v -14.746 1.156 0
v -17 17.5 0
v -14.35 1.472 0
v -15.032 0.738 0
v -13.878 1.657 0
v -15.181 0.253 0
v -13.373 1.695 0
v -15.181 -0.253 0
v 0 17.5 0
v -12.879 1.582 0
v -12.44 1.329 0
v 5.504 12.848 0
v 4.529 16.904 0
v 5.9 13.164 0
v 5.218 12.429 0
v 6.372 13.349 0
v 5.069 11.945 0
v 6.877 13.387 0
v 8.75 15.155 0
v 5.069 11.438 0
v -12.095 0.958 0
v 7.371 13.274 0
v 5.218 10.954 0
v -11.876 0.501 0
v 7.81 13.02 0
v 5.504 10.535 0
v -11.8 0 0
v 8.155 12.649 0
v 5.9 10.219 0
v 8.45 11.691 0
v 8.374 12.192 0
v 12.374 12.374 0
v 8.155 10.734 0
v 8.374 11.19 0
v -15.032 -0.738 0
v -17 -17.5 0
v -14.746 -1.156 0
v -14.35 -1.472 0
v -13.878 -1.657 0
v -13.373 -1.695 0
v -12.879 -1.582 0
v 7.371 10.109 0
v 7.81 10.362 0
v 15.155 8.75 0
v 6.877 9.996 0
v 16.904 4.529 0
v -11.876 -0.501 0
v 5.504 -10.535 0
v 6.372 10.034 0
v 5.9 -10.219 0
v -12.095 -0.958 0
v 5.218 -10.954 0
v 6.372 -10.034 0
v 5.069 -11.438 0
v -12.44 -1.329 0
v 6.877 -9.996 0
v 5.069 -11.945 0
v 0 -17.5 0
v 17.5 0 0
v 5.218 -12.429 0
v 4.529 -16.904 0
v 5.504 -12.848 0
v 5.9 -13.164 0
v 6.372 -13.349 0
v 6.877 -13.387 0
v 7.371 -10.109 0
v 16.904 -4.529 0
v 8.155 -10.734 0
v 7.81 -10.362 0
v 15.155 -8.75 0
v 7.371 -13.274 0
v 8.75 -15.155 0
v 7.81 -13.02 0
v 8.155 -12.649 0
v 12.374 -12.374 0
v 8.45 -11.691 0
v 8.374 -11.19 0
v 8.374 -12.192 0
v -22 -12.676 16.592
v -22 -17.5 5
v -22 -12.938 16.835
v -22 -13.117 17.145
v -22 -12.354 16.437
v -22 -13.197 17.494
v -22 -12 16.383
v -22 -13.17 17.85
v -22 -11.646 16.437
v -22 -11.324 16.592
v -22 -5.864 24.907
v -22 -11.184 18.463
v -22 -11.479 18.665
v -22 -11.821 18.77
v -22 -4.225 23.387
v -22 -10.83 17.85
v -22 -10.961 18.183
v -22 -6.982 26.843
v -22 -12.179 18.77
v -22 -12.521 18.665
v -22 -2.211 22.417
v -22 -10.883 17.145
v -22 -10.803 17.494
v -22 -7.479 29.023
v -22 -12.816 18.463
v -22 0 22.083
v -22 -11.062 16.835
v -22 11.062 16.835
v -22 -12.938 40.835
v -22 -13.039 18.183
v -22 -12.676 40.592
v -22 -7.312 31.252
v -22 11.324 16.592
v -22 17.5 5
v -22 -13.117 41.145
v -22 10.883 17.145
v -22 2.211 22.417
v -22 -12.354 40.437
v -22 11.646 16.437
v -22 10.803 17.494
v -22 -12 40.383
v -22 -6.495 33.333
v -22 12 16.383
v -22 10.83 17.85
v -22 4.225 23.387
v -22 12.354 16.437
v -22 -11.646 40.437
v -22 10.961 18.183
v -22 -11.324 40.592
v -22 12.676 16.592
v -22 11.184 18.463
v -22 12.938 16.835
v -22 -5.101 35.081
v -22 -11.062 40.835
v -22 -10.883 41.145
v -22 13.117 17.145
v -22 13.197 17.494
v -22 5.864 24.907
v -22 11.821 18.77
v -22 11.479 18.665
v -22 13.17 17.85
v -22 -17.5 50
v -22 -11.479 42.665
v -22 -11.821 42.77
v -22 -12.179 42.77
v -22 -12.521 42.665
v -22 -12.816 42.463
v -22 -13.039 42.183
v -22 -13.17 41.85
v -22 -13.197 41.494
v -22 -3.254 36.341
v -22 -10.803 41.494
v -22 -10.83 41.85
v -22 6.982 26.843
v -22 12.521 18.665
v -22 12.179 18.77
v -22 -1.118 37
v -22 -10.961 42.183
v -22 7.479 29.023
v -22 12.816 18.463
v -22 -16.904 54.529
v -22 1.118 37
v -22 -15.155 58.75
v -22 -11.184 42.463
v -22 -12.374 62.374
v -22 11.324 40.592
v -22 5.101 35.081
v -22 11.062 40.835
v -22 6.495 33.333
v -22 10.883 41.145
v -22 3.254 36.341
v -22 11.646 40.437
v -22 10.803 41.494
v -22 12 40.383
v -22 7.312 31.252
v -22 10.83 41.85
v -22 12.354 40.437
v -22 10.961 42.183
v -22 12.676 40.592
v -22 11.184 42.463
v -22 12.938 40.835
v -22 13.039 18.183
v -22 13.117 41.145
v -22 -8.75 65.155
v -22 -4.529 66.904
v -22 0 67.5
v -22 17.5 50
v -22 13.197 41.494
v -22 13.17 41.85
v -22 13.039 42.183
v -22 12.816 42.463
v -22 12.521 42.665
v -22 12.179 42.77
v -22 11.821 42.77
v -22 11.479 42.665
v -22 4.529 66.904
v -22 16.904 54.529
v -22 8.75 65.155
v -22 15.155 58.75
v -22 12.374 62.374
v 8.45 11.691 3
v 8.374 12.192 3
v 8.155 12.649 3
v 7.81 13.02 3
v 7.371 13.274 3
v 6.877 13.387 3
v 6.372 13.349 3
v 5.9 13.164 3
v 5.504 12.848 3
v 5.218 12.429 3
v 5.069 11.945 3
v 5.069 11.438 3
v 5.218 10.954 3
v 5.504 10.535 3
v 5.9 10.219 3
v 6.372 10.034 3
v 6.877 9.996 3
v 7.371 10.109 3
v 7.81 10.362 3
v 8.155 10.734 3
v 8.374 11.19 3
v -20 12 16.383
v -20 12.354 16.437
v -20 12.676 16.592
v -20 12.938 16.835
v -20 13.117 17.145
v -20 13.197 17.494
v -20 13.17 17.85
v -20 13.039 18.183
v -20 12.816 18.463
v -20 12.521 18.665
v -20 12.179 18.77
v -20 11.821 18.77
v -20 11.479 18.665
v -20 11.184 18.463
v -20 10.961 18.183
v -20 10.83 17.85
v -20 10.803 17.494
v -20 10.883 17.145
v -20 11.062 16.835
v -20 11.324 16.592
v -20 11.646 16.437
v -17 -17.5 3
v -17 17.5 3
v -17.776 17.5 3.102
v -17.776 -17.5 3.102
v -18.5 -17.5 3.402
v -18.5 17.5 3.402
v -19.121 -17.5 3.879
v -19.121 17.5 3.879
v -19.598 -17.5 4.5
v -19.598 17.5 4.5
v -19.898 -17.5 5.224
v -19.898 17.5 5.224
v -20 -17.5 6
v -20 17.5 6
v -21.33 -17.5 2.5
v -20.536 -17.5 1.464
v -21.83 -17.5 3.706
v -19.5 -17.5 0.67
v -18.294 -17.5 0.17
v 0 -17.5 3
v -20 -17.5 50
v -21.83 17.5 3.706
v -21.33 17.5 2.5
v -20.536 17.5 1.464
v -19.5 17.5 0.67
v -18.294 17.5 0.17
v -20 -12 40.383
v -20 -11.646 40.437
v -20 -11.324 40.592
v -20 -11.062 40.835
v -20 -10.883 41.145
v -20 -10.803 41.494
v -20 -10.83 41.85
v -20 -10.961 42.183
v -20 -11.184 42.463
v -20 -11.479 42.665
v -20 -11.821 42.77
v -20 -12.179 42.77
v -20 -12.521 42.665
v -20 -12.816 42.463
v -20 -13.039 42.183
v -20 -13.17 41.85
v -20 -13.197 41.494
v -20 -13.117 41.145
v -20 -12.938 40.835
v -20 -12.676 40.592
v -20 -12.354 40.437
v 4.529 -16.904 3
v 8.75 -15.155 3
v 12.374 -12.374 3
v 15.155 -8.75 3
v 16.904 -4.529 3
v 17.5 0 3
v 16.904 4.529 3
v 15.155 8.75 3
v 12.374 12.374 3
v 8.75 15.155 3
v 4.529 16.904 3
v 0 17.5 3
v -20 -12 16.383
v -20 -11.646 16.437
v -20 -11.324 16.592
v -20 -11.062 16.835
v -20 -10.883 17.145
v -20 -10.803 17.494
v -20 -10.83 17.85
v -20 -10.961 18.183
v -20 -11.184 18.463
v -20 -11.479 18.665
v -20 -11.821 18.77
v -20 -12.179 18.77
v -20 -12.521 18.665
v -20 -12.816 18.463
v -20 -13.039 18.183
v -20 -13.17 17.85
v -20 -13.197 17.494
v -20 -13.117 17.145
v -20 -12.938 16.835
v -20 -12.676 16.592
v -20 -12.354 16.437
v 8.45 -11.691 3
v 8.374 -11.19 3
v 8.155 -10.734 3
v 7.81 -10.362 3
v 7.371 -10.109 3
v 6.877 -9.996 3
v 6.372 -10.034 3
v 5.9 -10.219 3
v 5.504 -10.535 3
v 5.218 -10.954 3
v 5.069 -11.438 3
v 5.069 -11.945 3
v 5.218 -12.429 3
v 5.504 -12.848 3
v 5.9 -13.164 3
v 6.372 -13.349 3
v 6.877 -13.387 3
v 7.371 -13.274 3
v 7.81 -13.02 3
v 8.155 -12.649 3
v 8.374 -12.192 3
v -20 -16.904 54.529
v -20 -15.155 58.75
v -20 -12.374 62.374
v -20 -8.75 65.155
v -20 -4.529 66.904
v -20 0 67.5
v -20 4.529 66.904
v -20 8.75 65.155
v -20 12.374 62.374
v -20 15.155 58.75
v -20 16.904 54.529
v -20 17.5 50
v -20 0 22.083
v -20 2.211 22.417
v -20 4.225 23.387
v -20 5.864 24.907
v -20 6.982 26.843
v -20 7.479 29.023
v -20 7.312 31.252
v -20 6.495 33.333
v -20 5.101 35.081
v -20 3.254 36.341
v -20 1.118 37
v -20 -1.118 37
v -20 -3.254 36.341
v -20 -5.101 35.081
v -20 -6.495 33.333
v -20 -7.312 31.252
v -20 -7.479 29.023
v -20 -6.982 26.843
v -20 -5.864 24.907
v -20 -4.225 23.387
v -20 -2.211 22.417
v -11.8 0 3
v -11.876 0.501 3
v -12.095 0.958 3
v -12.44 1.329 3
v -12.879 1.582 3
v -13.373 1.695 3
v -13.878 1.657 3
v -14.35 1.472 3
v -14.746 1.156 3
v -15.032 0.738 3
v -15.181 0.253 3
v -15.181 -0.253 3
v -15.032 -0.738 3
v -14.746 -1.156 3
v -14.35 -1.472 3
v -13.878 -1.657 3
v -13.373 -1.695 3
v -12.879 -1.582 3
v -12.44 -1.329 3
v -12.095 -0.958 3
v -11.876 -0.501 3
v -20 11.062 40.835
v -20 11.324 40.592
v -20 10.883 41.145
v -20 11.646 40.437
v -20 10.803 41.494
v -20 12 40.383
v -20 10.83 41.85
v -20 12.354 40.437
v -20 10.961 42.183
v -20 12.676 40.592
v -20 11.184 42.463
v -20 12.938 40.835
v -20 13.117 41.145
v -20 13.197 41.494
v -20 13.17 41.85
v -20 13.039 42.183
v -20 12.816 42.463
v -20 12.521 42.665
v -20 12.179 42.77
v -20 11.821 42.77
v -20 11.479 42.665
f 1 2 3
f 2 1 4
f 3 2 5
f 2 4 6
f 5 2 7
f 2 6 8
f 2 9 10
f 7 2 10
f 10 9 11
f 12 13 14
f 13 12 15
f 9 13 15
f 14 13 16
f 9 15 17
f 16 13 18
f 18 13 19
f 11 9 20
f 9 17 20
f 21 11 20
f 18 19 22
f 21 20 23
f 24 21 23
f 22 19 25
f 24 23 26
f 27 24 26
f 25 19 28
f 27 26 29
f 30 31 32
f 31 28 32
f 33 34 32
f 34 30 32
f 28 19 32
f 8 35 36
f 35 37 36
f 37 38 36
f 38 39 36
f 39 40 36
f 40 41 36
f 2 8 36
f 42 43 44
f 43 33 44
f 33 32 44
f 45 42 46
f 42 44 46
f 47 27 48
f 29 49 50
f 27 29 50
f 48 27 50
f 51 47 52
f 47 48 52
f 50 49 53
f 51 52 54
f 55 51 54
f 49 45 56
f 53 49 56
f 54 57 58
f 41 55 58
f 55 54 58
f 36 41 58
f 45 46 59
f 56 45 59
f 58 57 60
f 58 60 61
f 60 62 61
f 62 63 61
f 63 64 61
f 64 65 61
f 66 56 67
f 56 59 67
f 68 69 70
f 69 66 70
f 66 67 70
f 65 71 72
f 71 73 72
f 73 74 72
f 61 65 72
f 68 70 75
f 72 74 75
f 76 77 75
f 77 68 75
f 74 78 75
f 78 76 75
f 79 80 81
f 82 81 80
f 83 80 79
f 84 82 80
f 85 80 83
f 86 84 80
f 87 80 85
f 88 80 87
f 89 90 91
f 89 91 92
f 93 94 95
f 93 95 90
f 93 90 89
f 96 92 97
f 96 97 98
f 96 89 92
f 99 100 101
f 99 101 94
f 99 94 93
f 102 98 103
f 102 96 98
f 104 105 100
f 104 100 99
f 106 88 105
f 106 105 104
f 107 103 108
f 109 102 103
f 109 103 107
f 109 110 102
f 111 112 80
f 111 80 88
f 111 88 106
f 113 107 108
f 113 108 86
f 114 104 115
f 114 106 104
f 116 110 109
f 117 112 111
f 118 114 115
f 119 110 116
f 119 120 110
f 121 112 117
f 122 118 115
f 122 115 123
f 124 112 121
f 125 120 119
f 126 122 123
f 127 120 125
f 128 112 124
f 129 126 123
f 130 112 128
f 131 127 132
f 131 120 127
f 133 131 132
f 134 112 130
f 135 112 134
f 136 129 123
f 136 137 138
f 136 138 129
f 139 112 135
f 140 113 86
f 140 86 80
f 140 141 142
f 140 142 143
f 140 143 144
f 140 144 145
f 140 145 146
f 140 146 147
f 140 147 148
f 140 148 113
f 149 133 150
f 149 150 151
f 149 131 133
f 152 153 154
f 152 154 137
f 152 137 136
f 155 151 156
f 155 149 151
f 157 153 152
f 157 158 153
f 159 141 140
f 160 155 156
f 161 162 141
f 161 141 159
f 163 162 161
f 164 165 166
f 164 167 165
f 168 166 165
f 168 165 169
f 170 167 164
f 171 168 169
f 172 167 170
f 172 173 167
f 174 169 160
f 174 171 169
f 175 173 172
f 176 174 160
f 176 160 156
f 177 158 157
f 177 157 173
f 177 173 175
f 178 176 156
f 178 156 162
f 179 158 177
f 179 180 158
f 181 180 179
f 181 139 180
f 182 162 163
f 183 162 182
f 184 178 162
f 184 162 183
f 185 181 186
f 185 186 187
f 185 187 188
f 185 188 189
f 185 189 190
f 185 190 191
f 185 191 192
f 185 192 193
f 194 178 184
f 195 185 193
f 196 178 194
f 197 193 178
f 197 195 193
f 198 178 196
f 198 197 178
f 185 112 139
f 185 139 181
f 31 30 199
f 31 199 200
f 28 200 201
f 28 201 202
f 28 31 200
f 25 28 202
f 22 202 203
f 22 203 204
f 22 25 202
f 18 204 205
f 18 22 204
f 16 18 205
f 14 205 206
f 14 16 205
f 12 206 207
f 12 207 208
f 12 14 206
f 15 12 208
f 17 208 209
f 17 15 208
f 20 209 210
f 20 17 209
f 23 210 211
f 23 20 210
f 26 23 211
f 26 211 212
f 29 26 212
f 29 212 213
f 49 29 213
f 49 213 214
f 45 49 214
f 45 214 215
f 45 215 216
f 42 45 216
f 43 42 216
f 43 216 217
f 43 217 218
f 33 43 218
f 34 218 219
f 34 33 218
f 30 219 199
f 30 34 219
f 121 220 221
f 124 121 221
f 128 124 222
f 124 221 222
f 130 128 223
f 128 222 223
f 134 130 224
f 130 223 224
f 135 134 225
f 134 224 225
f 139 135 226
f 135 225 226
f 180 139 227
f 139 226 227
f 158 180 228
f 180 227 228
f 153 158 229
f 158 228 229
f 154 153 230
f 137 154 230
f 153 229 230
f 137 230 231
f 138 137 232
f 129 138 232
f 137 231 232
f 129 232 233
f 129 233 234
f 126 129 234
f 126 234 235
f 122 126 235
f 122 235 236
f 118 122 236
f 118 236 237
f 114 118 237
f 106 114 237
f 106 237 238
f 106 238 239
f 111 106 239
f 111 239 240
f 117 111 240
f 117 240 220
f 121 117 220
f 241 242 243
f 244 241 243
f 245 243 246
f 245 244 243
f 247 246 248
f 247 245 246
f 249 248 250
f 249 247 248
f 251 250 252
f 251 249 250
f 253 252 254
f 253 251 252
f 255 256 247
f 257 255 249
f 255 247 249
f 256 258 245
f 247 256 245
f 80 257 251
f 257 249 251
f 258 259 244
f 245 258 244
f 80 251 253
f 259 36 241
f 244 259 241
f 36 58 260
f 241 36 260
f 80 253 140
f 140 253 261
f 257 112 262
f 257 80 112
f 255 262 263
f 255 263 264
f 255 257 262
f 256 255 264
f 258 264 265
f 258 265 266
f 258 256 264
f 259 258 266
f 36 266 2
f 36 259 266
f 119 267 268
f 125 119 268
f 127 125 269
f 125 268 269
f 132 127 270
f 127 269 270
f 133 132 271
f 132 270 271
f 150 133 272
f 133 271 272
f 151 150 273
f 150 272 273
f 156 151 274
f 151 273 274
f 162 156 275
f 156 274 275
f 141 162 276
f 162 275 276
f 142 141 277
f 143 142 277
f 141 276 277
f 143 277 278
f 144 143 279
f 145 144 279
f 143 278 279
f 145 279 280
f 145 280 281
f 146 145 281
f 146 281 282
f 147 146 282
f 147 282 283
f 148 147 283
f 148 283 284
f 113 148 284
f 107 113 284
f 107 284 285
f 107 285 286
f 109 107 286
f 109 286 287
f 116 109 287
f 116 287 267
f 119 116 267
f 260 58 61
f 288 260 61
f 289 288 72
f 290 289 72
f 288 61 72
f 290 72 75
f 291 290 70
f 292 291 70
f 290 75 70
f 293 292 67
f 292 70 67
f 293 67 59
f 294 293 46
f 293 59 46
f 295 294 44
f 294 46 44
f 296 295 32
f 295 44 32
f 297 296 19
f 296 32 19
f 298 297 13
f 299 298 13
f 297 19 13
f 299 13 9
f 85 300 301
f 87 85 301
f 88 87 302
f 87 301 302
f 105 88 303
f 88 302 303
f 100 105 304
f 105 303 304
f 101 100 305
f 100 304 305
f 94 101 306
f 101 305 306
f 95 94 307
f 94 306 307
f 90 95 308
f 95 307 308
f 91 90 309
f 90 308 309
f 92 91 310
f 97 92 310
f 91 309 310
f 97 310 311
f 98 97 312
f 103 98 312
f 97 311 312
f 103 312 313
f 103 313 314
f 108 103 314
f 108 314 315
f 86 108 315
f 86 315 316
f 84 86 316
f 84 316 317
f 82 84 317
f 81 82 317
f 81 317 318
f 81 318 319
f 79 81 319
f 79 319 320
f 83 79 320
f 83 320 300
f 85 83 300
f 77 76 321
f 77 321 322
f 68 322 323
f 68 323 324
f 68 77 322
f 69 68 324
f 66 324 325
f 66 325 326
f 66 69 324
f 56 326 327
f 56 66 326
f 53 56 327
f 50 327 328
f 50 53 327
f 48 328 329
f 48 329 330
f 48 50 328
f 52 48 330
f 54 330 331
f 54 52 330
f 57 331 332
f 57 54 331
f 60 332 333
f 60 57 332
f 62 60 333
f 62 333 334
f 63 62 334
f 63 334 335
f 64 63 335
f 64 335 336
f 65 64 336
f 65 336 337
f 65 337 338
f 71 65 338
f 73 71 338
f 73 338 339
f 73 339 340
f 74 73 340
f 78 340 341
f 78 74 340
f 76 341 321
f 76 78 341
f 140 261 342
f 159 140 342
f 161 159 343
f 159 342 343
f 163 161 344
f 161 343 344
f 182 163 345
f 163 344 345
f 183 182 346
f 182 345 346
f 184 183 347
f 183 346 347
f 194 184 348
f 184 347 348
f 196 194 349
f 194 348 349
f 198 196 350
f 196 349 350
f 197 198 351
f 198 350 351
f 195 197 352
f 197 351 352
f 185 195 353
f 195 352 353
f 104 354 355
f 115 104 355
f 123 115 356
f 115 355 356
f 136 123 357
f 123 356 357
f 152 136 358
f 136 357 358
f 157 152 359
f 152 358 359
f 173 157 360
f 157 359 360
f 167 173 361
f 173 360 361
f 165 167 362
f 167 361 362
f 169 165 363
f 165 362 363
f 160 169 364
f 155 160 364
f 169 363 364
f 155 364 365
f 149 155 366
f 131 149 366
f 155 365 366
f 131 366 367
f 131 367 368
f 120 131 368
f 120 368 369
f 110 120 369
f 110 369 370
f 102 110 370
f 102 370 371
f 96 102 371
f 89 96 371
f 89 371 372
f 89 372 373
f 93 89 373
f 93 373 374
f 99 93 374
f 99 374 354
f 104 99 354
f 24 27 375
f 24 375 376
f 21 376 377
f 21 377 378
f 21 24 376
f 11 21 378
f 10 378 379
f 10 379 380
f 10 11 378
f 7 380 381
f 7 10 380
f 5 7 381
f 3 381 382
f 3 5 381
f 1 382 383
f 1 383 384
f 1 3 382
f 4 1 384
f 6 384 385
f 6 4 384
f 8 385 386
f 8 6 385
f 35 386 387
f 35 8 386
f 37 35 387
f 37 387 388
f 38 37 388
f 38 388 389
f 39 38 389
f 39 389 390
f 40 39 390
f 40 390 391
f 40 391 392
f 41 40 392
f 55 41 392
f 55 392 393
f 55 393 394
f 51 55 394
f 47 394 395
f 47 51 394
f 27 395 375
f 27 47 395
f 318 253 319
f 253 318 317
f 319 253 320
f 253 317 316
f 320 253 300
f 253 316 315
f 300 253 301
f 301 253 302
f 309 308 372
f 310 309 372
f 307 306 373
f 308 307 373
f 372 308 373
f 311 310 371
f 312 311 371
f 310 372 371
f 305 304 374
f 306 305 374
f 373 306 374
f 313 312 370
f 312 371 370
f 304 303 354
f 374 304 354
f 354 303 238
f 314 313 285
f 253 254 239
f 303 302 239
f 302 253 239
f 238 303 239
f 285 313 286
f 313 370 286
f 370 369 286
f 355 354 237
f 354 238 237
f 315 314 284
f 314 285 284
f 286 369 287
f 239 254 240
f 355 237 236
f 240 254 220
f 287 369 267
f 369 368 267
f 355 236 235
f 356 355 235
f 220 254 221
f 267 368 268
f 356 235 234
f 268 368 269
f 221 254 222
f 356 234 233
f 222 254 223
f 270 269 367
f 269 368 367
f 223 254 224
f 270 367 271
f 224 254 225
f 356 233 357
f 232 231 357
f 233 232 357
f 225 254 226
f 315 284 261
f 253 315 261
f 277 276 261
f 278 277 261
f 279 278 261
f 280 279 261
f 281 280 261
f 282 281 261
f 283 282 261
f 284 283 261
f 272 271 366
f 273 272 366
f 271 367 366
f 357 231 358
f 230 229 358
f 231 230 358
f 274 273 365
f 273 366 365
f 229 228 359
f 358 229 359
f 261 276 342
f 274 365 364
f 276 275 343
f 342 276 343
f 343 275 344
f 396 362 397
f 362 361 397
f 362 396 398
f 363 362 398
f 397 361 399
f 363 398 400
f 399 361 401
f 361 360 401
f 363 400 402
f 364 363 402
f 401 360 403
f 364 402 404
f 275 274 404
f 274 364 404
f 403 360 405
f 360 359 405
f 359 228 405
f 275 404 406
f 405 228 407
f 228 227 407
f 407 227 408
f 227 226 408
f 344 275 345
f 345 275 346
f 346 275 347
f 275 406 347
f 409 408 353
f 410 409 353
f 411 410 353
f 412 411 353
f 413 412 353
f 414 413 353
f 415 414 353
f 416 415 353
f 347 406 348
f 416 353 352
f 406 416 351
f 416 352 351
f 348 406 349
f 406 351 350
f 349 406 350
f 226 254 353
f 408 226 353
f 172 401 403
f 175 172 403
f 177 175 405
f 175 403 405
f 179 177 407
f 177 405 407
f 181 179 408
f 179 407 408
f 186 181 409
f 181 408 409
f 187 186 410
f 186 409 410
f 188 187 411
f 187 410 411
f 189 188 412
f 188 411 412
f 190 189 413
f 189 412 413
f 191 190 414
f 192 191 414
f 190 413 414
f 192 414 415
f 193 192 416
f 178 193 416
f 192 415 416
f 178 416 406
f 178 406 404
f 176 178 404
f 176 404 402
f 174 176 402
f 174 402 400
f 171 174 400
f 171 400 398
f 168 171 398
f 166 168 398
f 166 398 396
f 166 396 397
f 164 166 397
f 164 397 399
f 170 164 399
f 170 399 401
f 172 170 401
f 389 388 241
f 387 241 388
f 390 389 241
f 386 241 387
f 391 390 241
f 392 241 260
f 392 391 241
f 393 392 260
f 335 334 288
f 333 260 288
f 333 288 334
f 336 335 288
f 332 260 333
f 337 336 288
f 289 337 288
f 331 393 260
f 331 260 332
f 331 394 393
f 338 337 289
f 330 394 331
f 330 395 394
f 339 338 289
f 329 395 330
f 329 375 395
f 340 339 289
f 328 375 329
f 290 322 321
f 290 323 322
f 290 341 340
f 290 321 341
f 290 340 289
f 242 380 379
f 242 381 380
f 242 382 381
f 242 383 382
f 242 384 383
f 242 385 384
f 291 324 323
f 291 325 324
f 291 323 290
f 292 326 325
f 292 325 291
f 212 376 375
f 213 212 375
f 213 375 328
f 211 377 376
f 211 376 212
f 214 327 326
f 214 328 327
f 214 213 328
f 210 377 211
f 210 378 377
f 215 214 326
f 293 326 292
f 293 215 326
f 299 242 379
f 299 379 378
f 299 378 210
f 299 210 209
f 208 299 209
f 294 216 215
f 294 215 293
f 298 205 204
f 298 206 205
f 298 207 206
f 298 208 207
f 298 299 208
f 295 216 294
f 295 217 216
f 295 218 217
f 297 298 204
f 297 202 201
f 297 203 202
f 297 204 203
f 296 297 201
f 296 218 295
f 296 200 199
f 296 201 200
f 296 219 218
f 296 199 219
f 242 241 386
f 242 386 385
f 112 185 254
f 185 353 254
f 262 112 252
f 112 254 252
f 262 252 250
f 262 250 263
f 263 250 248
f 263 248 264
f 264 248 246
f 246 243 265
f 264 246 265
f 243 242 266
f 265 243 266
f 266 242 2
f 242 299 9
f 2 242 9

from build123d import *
from OCP.BRepFilletAPI import BRepFilletAPI_MakeFillet

# Parameters (mm, degrees)
SKETCH_1_R          = 1.7
EXTRUDE_1_DEPTH     = 3
EXTRUDE_2_DEPTH     = 2
FILLET_1_R1         = 3
FILLET_1_R2         = 5
SKETCH_3_R          = 1.2
SKETCH_3_R_2        = 7.5
CUT_EXTRUDE_1_DEPTH = 3


with BuildPart() as part:
    # 草图1 → 凸台-拉伸1 (new body)
    with BuildSketch(Plane.XY):
        with BuildLine():
            Line((0, 17.5), (-20, 17.5))
            Line((-20, 17.5), (-20, -17.5))
            Line((-20, -17.5), (0, -17.5))
            ThreePointArc((0, -17.5), (17.5, 0), (0, 17.5))
        make_face()
        with Locations((-13.5, 0)):
            Circle(SKETCH_1_R, mode=Mode.SUBTRACT)
        with Locations((6.75, 11.691342951)):
            Circle(SKETCH_1_R, mode=Mode.SUBTRACT)
        with Locations((6.75, -11.691342951)):
            Circle(SKETCH_1_R, mode=Mode.SUBTRACT)
    extrude(amount=EXTRUDE_1_DEPTH)

    # 草图2 → 凸台-拉伸2 (add)
    with BuildSketch(Plane.ZY.offset(20)):
        with BuildLine():
            Line((0, -17.5), (50, -17.5))
            ThreePointArc((50, -17.5), (67.5, 0), (50, 17.5))
            Line((50, 17.5), (0, 17.5))
            Line((0, 17.5), (0, -17.5))
        make_face()
    extrude(amount=EXTRUDE_2_DEPTH)

    # 圆角1: one fillet with a radius per group of edges: ONE call of the kernel's fillet builder (fillet() takes one radius for all edges)
    fillet_1_edges_1 = [part.edges().sort_by_distance(p)[0] for p in [
        (-20, 0, 3),
    ]]
    fillet_1_edges_2 = [part.edges().sort_by_distance(p)[0] for p in [
        (-22, 0, 0),
    ]]
    fillet_1 = BRepFilletAPI_MakeFillet(part.part.solid().wrapped)
    for e in fillet_1_edges_1:
        fillet_1.Add(FILLET_1_R1, e.wrapped)
    for e in fillet_1_edges_2:
        fillet_1.Add(FILLET_1_R2, e.wrapped)
    add(Compound.cast(fillet_1.Shape()), mode=Mode.REPLACE)

    # 草图3 → 切除-拉伸1 (cut)
    with BuildSketch(Plane(origin=(-20, 0, 0), x_dir=(0, 0, -1), z_dir=(1, 0, 0))):
        with Locations((-41.583465403, -12)):
            Circle(SKETCH_3_R)
        with Locations((-17.583465403, -12)):
            Circle(SKETCH_3_R)
        with Locations((-17.583465403, 12)):
            Circle(SKETCH_3_R)
        with Locations((-41.583465403, 12)):
            Circle(SKETCH_3_R)
        with Locations((-29.583465403, 0)):
            Circle(SKETCH_3_R_2)
    extrude(amount=-CUT_EXTRUDE_1_DEPTH, mode=Mode.SUBTRACT)


solid = part.part
